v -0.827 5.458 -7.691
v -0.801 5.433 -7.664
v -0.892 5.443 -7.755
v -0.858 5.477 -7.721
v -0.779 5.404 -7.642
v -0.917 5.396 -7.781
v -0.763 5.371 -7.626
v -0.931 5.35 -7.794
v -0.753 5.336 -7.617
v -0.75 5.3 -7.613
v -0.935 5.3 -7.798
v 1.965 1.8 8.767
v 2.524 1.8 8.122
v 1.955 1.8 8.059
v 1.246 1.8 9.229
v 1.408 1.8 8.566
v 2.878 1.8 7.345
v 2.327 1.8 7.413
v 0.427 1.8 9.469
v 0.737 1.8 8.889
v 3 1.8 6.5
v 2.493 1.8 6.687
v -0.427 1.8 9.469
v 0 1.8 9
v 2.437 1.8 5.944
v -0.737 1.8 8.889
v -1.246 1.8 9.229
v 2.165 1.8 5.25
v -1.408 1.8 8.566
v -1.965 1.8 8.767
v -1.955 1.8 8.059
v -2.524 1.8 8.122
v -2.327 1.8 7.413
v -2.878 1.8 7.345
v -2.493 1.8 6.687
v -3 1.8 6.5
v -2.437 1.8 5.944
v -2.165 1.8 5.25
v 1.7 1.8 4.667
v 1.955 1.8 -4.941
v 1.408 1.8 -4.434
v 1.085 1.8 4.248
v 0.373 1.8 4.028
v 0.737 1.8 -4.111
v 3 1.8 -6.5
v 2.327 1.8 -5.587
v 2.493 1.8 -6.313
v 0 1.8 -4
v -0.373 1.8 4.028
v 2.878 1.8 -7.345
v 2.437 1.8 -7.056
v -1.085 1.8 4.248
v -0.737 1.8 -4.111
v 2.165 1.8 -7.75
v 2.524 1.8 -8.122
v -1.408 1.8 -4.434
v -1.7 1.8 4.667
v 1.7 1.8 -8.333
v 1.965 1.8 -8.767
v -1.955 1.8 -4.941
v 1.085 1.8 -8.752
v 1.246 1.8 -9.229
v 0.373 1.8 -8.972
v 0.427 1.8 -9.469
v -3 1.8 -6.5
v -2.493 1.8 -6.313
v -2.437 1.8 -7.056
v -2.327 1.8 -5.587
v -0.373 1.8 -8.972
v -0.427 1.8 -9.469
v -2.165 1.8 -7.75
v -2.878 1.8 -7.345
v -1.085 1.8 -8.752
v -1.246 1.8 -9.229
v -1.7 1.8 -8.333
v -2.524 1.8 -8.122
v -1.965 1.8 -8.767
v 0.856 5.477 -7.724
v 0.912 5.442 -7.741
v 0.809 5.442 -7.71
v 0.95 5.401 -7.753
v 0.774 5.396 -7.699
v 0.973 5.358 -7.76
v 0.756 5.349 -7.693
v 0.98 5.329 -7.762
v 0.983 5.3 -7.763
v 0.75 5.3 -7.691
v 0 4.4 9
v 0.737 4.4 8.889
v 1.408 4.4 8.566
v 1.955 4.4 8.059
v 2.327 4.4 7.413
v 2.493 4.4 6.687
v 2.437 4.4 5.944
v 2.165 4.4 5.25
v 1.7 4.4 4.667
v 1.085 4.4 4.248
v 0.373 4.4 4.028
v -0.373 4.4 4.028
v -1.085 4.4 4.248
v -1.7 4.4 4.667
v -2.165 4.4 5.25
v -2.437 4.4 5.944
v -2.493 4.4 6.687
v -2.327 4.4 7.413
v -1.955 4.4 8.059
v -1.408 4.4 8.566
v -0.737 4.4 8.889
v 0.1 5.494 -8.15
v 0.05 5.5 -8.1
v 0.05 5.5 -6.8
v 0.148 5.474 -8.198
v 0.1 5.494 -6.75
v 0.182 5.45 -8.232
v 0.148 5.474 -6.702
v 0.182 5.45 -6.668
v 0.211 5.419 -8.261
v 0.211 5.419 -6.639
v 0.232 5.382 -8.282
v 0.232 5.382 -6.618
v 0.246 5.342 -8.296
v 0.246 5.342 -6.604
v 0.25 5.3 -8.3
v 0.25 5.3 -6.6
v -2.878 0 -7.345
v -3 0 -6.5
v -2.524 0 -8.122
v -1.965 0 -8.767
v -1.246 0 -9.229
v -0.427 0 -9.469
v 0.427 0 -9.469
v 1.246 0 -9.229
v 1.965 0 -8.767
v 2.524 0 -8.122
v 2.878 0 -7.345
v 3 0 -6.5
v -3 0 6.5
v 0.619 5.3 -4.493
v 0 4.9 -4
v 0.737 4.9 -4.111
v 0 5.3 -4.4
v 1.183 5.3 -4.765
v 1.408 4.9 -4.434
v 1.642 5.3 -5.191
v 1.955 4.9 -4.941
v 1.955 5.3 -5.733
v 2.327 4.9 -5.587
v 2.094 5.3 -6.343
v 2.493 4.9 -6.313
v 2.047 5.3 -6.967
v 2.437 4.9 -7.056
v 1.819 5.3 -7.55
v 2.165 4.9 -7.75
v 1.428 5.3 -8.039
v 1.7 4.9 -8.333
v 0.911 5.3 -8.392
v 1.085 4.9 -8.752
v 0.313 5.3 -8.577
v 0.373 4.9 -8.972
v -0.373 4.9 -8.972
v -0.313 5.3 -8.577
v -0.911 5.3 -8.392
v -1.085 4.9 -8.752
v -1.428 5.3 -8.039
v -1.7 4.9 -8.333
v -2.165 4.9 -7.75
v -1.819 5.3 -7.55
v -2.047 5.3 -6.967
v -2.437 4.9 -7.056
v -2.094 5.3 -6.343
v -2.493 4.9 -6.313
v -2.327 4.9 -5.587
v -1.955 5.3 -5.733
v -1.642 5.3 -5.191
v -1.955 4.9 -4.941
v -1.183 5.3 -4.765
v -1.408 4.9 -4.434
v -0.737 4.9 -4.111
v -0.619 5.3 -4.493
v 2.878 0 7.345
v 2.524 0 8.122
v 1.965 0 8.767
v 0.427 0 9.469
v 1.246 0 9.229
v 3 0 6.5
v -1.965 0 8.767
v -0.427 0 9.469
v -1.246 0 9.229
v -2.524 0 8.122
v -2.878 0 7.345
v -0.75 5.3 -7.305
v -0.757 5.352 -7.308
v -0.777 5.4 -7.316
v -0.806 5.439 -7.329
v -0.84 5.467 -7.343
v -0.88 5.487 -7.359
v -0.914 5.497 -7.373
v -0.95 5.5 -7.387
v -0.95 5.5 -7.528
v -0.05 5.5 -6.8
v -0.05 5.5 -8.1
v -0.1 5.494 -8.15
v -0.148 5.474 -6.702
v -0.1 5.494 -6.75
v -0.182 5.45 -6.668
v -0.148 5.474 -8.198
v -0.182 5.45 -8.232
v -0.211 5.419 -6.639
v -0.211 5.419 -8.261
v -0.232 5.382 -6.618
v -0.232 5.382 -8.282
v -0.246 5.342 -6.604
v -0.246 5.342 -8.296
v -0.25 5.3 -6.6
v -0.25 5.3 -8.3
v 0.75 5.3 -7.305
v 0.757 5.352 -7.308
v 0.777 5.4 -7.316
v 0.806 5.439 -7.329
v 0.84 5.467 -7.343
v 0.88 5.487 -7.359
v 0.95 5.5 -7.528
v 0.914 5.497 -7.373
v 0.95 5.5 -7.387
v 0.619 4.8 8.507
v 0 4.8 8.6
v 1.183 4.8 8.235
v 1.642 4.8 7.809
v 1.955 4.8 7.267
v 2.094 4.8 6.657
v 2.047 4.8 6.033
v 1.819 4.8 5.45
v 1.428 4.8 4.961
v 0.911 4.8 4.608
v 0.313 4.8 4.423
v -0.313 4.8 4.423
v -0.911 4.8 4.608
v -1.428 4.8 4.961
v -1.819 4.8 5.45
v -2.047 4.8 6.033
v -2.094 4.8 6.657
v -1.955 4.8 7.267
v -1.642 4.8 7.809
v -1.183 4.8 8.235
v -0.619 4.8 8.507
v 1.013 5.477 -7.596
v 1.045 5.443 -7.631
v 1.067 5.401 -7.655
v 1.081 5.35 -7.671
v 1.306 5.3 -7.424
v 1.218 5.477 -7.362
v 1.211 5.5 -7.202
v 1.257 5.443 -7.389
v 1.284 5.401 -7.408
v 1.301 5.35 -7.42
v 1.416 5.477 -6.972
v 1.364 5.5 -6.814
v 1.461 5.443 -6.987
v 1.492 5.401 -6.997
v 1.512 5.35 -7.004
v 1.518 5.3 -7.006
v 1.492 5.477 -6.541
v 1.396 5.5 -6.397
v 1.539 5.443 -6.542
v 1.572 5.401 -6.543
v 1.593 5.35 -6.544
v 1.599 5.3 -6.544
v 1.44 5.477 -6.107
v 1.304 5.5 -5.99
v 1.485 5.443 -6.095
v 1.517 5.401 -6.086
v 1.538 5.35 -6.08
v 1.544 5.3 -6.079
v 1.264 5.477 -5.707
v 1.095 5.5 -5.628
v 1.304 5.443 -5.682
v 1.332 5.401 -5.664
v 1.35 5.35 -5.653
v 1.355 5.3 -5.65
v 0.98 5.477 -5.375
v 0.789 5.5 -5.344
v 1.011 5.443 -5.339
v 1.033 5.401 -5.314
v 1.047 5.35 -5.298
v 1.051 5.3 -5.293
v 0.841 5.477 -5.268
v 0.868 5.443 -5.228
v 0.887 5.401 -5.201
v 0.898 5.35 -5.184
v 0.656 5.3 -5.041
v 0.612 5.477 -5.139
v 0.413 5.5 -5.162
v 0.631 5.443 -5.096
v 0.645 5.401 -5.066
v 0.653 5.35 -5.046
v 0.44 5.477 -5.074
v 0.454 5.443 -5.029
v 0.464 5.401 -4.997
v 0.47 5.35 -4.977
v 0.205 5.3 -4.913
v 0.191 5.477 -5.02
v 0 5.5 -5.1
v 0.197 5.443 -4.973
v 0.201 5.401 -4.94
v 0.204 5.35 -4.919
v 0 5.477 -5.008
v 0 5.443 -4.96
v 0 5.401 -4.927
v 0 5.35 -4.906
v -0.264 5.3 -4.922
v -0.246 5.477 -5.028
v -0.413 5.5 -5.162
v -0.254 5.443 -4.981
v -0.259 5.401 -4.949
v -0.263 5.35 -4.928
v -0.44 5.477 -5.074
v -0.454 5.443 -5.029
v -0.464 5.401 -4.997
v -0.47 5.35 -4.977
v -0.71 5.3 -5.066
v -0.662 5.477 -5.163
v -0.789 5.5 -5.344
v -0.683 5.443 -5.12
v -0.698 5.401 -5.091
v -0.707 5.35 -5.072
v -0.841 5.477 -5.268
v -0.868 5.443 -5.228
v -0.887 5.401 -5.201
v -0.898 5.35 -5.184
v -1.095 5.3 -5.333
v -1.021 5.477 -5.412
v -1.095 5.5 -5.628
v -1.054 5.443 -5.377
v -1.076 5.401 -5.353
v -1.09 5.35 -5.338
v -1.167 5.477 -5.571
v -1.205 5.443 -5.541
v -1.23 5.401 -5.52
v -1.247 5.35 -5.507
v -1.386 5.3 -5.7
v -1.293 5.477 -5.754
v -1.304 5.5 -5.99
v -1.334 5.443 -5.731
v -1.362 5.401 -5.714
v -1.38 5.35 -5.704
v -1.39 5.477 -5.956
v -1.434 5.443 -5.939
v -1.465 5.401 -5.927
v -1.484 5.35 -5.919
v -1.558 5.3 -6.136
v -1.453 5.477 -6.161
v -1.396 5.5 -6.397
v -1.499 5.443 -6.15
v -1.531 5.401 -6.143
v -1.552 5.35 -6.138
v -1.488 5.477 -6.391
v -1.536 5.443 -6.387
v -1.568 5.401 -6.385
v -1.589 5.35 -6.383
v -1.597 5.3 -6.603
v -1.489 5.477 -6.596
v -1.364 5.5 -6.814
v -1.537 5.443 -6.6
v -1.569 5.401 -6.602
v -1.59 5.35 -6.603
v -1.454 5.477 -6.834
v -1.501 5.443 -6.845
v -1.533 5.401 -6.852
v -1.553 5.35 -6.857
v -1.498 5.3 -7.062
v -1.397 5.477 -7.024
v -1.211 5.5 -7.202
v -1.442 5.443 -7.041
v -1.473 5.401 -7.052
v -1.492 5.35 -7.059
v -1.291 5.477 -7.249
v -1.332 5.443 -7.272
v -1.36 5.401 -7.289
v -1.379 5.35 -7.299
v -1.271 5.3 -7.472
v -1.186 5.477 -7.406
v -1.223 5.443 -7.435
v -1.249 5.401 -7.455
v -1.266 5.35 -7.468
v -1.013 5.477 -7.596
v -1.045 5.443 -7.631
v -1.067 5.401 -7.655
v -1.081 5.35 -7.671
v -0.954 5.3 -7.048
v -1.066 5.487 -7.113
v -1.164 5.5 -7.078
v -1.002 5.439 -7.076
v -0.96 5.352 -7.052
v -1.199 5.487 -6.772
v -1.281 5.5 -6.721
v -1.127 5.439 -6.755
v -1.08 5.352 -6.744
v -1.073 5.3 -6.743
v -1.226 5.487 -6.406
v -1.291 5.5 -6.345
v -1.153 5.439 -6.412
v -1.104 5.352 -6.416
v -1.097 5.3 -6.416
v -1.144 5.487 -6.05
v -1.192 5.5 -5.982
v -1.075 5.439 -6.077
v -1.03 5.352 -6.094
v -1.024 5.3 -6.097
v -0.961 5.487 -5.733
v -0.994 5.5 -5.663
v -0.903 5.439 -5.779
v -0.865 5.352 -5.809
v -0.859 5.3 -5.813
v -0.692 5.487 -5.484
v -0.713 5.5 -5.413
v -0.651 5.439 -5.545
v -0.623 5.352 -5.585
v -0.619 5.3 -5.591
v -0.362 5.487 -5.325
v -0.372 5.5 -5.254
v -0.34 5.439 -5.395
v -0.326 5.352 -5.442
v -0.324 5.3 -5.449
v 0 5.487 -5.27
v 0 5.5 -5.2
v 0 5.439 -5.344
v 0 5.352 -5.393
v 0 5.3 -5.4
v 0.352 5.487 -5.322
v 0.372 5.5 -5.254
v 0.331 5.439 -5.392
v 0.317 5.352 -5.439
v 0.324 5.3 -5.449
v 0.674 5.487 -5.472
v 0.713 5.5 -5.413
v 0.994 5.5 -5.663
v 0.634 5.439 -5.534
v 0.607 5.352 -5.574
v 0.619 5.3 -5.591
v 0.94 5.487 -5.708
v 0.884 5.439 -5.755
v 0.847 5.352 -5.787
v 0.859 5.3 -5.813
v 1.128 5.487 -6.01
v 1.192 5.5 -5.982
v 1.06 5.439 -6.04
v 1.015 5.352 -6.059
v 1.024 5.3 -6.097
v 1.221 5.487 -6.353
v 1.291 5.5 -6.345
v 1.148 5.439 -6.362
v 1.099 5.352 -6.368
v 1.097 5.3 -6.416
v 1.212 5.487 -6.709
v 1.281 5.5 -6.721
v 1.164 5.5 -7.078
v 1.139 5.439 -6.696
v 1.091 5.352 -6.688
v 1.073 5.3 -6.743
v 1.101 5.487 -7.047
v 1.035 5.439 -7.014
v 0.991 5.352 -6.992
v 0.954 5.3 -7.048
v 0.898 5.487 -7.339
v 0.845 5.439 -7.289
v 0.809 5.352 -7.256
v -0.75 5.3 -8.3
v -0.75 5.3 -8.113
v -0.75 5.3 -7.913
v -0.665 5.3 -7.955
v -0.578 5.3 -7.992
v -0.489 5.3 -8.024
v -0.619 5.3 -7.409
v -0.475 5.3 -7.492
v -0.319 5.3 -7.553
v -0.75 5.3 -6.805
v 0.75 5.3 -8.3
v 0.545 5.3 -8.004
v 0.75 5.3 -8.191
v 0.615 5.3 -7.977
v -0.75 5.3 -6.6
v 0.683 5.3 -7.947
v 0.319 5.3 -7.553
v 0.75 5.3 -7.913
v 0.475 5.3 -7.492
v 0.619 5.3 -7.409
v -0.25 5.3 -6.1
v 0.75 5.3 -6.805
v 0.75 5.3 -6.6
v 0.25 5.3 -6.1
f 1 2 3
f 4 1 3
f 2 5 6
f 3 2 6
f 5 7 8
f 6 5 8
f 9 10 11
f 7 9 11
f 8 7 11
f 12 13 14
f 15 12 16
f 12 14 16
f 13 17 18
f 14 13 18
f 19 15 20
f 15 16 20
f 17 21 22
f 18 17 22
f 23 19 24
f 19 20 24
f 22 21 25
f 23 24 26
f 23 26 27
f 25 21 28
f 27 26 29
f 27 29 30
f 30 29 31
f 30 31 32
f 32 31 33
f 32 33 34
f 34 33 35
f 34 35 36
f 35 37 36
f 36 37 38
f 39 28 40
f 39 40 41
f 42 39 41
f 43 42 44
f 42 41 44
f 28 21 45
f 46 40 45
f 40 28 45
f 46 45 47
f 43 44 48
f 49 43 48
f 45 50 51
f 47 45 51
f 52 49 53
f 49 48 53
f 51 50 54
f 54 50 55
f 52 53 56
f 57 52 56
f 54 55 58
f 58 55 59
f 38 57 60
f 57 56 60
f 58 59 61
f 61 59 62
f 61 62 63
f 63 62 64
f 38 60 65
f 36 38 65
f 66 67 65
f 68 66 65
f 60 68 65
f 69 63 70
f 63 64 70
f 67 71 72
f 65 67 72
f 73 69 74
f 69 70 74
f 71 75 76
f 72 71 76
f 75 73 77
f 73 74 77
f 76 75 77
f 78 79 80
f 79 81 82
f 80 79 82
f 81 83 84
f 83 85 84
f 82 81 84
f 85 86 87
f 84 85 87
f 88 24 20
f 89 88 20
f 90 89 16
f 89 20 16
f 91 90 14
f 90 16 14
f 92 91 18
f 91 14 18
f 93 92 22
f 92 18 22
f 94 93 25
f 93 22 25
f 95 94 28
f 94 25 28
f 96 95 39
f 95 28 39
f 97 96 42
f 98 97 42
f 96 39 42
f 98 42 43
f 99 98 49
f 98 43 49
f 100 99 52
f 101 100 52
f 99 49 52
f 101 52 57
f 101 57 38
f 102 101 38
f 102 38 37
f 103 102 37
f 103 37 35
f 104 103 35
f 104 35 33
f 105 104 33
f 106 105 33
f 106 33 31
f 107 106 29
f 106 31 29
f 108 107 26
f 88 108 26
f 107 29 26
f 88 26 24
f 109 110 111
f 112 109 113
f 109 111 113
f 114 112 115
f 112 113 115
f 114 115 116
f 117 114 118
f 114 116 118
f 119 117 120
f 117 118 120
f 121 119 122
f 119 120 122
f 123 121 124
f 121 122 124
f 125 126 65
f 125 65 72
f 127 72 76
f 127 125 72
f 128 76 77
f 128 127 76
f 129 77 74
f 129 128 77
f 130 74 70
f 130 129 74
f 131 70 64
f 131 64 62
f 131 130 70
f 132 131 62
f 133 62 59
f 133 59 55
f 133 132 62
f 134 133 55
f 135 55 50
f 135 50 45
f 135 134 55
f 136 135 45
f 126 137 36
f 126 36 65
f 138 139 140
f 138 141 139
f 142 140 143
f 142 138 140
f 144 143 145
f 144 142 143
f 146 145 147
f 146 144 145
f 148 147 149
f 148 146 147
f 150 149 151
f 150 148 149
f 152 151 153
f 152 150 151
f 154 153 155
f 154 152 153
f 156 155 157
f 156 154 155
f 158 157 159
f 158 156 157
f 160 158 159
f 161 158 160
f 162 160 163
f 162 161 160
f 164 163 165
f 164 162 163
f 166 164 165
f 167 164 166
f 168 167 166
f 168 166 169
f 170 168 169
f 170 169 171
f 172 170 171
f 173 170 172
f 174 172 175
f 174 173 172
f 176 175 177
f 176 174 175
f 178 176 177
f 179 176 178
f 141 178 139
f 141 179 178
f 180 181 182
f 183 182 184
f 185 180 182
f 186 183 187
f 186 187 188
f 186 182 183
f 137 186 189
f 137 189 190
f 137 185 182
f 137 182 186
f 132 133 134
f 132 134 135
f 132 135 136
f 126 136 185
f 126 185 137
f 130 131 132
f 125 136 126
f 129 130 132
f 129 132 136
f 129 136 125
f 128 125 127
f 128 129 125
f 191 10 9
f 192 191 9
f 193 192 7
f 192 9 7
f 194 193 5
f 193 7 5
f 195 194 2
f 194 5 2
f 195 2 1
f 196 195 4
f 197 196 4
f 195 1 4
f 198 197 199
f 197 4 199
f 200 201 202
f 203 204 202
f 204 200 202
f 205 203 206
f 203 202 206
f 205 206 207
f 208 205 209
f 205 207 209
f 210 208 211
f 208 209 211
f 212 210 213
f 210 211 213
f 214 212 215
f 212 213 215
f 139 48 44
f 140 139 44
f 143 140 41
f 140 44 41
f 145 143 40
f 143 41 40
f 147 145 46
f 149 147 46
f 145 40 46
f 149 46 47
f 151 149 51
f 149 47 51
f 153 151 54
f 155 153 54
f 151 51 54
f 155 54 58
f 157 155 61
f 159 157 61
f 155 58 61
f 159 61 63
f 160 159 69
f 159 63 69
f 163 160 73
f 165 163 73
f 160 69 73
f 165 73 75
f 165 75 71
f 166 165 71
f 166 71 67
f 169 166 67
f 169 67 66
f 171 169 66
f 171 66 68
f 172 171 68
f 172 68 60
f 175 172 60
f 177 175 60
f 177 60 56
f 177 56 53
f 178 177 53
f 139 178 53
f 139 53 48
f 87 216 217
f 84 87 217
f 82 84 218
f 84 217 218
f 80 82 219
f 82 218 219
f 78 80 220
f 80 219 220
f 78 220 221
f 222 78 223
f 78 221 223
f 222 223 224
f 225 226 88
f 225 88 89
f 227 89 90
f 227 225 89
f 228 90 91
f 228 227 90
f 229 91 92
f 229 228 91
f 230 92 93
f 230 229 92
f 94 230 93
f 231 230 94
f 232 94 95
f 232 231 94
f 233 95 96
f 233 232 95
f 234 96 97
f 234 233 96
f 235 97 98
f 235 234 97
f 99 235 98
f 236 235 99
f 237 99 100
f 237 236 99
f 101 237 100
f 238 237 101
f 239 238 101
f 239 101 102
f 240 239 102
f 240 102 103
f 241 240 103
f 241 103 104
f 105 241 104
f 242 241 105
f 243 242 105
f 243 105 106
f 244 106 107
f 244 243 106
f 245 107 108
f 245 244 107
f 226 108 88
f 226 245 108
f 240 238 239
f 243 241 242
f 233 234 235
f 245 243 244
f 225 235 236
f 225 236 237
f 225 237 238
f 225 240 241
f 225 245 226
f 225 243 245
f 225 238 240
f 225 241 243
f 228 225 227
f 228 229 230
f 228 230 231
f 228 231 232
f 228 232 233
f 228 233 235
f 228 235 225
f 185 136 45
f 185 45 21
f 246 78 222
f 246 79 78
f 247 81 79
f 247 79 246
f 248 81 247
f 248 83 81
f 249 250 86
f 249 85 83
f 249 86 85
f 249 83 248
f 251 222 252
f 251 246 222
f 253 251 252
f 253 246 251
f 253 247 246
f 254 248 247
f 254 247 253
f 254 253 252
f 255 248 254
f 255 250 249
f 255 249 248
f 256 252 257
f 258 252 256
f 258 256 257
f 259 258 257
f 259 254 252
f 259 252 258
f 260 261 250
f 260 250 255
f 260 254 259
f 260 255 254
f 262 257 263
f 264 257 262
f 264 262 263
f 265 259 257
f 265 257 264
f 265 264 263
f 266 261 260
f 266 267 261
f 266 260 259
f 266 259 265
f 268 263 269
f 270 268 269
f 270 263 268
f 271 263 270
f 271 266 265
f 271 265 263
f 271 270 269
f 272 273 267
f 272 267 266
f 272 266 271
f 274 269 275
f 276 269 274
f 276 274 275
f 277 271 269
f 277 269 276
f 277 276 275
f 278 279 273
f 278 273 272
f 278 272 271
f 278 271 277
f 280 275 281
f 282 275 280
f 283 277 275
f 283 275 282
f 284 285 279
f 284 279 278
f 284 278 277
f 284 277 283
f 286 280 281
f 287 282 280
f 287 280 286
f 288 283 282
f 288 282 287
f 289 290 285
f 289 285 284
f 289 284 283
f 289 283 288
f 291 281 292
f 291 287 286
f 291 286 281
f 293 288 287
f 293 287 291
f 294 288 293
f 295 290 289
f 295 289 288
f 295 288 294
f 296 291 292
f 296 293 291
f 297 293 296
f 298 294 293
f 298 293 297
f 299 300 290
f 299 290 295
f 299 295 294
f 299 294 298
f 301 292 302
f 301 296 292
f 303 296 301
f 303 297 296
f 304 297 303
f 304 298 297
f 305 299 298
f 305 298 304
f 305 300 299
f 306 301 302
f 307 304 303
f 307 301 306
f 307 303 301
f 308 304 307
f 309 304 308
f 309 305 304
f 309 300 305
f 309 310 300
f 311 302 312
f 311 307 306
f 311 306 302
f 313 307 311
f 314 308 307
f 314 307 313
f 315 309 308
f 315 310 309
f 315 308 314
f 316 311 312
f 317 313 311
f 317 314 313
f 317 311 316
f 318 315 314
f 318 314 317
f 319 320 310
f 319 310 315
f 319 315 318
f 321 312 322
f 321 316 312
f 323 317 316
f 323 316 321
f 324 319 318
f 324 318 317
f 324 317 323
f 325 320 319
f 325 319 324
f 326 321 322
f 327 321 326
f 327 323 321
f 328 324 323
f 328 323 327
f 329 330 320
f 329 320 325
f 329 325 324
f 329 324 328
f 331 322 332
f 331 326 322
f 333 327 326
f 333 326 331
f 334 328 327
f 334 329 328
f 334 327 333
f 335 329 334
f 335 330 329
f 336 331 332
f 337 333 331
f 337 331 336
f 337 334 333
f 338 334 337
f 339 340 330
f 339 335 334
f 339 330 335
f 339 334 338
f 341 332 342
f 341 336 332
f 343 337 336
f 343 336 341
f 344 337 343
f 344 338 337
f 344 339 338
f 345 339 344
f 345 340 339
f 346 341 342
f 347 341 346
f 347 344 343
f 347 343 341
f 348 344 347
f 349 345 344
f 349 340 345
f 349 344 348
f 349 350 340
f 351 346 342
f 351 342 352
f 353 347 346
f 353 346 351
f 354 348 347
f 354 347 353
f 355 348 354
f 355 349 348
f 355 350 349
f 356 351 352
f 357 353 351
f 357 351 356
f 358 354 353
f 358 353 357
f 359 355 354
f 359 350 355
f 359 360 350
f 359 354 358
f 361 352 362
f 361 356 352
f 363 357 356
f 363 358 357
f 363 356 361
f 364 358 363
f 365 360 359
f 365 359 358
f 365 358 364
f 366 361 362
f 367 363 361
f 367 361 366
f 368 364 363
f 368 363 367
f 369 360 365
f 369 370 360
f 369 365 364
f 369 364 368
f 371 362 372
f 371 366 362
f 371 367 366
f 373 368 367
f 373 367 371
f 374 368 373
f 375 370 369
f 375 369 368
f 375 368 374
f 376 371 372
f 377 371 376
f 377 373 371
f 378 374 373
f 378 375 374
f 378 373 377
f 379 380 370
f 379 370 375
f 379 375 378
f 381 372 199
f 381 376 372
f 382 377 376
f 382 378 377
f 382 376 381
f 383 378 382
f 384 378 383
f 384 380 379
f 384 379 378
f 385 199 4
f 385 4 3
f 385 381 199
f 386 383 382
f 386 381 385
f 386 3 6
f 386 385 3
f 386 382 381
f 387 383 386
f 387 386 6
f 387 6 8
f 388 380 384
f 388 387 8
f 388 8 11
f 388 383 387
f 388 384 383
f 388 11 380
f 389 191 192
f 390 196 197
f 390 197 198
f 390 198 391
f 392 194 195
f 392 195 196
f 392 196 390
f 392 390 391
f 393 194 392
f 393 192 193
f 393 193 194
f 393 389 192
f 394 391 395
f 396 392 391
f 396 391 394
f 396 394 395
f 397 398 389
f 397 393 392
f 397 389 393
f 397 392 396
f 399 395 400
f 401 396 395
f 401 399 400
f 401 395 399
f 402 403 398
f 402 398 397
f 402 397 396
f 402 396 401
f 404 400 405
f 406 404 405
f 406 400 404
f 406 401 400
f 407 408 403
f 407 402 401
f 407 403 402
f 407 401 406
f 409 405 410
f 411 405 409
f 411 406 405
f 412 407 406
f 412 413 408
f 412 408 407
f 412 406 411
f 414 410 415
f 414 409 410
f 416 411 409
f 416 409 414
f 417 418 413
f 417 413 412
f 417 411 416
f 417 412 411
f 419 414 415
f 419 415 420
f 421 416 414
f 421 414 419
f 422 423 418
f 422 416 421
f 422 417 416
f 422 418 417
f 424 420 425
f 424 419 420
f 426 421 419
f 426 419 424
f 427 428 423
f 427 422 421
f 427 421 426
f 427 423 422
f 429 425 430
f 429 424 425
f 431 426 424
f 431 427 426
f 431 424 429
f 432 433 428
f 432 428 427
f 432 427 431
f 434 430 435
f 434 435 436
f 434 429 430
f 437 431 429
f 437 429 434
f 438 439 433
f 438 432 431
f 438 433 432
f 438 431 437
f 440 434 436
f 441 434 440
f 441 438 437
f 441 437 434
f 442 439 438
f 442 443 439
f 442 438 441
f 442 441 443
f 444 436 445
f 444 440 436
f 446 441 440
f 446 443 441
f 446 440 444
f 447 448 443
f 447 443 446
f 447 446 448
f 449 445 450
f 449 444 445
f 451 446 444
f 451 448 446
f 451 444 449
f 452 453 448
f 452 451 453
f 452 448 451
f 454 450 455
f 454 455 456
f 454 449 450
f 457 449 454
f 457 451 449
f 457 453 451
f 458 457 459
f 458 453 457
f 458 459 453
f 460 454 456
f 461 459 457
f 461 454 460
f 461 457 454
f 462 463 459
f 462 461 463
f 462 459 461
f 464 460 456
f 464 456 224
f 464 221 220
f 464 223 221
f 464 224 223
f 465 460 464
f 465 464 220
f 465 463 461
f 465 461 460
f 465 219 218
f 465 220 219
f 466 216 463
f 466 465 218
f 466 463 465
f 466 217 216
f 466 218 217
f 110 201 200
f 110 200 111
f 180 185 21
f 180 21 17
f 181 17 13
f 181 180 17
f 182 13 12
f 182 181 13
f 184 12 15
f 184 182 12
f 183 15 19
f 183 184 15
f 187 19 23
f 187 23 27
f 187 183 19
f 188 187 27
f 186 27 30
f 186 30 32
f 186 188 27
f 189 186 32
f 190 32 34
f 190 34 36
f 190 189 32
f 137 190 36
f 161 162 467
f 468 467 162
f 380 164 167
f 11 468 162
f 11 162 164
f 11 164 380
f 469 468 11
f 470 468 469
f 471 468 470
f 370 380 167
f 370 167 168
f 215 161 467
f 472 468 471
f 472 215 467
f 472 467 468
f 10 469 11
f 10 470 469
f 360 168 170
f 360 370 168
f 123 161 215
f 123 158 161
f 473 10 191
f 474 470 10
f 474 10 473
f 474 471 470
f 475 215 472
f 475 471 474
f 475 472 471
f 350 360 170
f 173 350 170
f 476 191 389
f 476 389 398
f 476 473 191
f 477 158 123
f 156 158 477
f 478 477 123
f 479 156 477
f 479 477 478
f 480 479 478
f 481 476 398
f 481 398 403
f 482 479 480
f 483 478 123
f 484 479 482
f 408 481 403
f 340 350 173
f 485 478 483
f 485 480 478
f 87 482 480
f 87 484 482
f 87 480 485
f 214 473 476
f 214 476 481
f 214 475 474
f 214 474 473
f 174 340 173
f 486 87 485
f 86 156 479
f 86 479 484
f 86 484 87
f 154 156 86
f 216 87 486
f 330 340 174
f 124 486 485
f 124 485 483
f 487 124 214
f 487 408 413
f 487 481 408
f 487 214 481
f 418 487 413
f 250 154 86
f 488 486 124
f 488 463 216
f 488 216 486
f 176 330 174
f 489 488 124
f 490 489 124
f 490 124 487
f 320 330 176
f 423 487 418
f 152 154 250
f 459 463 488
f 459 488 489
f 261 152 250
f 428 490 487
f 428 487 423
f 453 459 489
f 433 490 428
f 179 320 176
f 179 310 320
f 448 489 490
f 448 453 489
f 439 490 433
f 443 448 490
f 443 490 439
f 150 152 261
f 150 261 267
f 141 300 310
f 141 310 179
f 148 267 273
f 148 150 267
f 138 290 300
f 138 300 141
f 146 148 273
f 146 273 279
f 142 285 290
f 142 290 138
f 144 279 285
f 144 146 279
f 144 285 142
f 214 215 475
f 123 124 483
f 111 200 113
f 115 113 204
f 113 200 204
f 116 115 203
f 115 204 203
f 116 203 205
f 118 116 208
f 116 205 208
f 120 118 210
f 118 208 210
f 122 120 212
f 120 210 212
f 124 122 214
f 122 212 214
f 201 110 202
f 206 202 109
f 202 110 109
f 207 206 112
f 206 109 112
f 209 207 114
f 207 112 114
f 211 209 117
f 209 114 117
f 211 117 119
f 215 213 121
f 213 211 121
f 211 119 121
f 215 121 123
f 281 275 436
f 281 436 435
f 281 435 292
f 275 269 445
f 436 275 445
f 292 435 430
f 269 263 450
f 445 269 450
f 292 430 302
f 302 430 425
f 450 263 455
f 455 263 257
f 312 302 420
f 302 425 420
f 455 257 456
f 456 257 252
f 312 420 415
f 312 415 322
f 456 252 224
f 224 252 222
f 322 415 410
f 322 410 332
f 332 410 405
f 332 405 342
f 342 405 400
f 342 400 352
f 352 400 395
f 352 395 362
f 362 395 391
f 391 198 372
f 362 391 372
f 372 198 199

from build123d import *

# Parameters (mm, degrees)
BOSS_EXTRUDE1_DEPTH = 1.8
SKETCH2_R           = 2.500000000000001
BOSS_EXTRUDE2_DEPTH = 3
SKETCH3_R           = 2.5000000000000013
BOSS_EXTRUDE3_DEPTH = 0.5
CHAMFER1_SIZE       = 0.4
SKETCH4_W           = 0.5
SKETCH4_H           = 1.7000000000000002
BOSS_EXTRUDE4_DEPTH = 0.2
CHAMFER2_SIZE       = 0.3
CHAMFER2_SIZE_2     = 0.221880218
FILLET1_R           = 0.2


with BuildPart() as part:
    # Sketch1 → Boss-Extrude1 (new body)
    with BuildSketch(Plane(origin=(0, 0, 0), x_dir=(1, 0, 0), z_dir=(0, 1, 0))):
        with BuildLine():
            Line((-3, -6.5), (-3.0000000000000027, 6.499999999999998))
            ThreePointArc((-3.0000000000000027, 6.499999999999998), (-4.2e-15, 9.5), (2.9999999999999973, 6.500000000000002))
            Line((2.9999999999999973, 6.500000000000002), (3, -6.5))
            ThreePointArc((3, -6.5), (-5.5e-16, -9.5), (-3, -6.5))
        make_face()
    extrude(amount=BOSS_EXTRUDE1_DEPTH)

    # Sketch2 → Boss-Extrude2 (add)
    with BuildSketch(Plane(origin=(0, 1.8, 0), x_dir=(1, 0, 0), z_dir=(0, 1, 0))):
        with Locations(Location((-2.39e-15, 6.5, 0), (0, 0, 270))):
            Circle(SKETCH2_R)
        with Locations(Location((0, -6.5, 0), (0, 0, 270))):
            Circle(SKETCH2_R)
    extrude(amount=BOSS_EXTRUDE2_DEPTH)

    # Sketch3 → Boss-Extrude3 (add)
    with BuildSketch(Plane(origin=(0, 4.800000000000001, 0), x_dir=(1, 0, 0), z_dir=(0, 1, 0))):
        with Locations(Location((-2.39e-15, 6.5, 0), (0, 0, 270))):
            Circle(SKETCH3_R)
    extrude(amount=BOSS_EXTRUDE3_DEPTH)

    # Chamfer1
    chamfer1_edges = [part.edges().sort_by_distance(p)[0] for p in [
        (7.7e-16, 4.8, 3.999999999999999),
        (-1.62e-15, 5.300000000000001, -9.000000000000002),
    ]]
    chamfer(chamfer1_edges, length=CHAMFER1_SIZE)

    # Sketch4 → Boss-Extrude4 (add)
    with BuildSketch(Plane(origin=(0, 5.300000000000001, 0), x_dir=(1, 0, 0), z_dir=(0, 1, 0))):
        with BuildLine():
            Line((-0.75, 7.913329402510258), (-0.75, 7.304673846971556))
            ThreePointArc((-0.75, 7.304673846971556), (-4.54e-15, 5.4), (0.75, 7.304673846971556))
            Line((0.75, 7.304673846971556), (0.75, 7.913329402510258))
            ThreePointArc((0.75, 7.913329402510258), (-5.52e-15, 4.9), (-0.75, 7.913329402510258))
        make_face()
        with Locations((-2.76e-15, 7.449999999999999)):
            Rectangle(SKETCH4_W, SKETCH4_H)
    extrude(amount=BOSS_EXTRUDE4_DEPTH)

    # Chamfer2
    # the kernel refuses this chamfer: 0.3, 0.221880218 mm, written as the material it takes off along each edge
    with BuildSketch(Plane(origin=(-0.75, 5.300000000000001, -7.913329402510258), x_dir=(0, 0, 1), z_dir=(0, 1, 0))) as chamfer2_piece_1:
        with BuildLine():
            Line((CHAMFER2_SIZE, 0), (0.11497408326020686, -0.18502591673979885))
            ThreePointArc((0.11497408326020686, -0.18502591673979885), (0.05505412011014688, -0.09562891224277614), (0, 0))
            Line((0, 0), (CHAMFER2_SIZE, 0))
        make_face()
    extrude(amount=0.9715048963897726, mode=Mode.SUBTRACT)
    with BuildSketch(Plane(origin=(0.75, 5.300000000000001, -7.913329402510258), x_dir=(0.8394299671515956, 0, 0.5434678741635711), z_dir=(0, 1, 0))) as chamfer2_piece_2:
        with BuildLine():
            Line((0.27705330102285075, 2e-17), (CHAMFER2_SIZE_2 * 0.543467874804, -CHAMFER2_SIZE_2 * 0.83942996814))
            Line((CHAMFER2_SIZE_2 * 0.543467874804, -CHAMFER2_SIZE_2 * 0.83942996814), (0, 0))
            ThreePointArc((0, 0), (0.14238943823073183, 0.00600337759415658), (0.27705330102285075, 2e-17))
        make_face()
    extrude(amount=0.9123006442989672, mode=Mode.SUBTRACT)

    # Fillet1
    # the kernel refuses this fillet: 0.2 mm, written as the material it takes off along each edge
    with BuildSketch(Plane(origin=(-0.7500000000000032, 5.500000000000001, -6.599999999999999), x_dir=(0, -1, 0), z_dir=(1, 0, 0))) as fillet1_piece_1:
        with BuildLine():
            CenterArc((FILLET1_R, FILLET1_R), FILLET1_R, 180, 90)
            Line((0, FILLET1_R), (0, 0))
            Line((0, 0), (FILLET1_R, 0))
        make_face()
    extrude(amount=1.5000000000000009, mode=Mode.SUBTRACT)
    with BuildSketch(Plane(origin=(-0.2500000000000028, 5.500000000000001, -8.799999999999999), x_dir=(0, -1, 0), z_dir=(0, 0, 1)), Plane(origin=(0.24999999999999725, 5.500000000000001, -6.099999999999998), x_dir=(0, -1, 0), z_dir=(0, 0, -1))) as fillet1_piece_2:
        with BuildLine():
            CenterArc((FILLET1_R, FILLET1_R), FILLET1_R, 180, 90)
            Line((0, FILLET1_R), (0, 0))
            Line((0, 0), (FILLET1_R, 0))
        make_face()
    extrude(amount=2.700000000000001, mode=Mode.SUBTRACT)
    with BuildSketch(Plane(origin=(0.7499999999999977, 5.500000000000001, -8.299999999999999), x_dir=(0, -1, 0), z_dir=(-1, 0, 0))) as fillet1_piece_3:
        with BuildLine():
            CenterArc((FILLET1_R, FILLET1_R), FILLET1_R, 180, 90)
            Line((0, FILLET1_R), (0, 0))
            Line((0, 0), (FILLET1_R, 0))
        make_face()
    extrude(amount=1.5000000000000009, mode=Mode.SUBTRACT)
    with BuildSketch(Plane(origin=(-0.75, 5.500000000000001, -8.11332940251), x_dir=(0, -1, 0), z_dir=(0, 0, 1))) as fillet1_piece_4:
        with BuildLine():
            CenterArc((FILLET1_R, -FILLET1_R), FILLET1_R, 90, 90)
            Line((0, -FILLET1_R), (0, 0))
            Line((0, 0), (FILLET1_R, 0))
        make_face()
    extrude(amount=1.3086555555384454, mode=Mode.SUBTRACT)
    with BuildSketch(Plane(origin=(-8e-17, 5.500000000000001, -6.500000000000001), x_dir=(-0.2897858618854929, 0, -0.9570915077730457), z_dir=(0.9570915077730457, 0, -0.2897858618854929))) as fillet1_piece_5:
        with BuildLine():
            CenterArc((1.1000000000000005 + FILLET1_R, -FILLET1_R), FILLET1_R, 90.00000000000006, 89.99999999999994)
            Line((1.1000000000000005 + FILLET1_R, 0), (1.1000000000000005, 0))
            Line((1.1000000000000005, 0), (1.1000000000000005, -FILLET1_R))
        make_face()
    revolve(axis=Axis((-8e-17, 5.500000000000001, -6.500000000000001), (0, 1, 0)), revolution_arc=326.3097273547943, mode=Mode.SUBTRACT)
    with BuildSketch(Plane(origin=(0.75, 5.500000000000001, -6.804673846971555), x_dir=(0, -1, 0), z_dir=(0, 0, -1))) as fillet1_piece_6:
        with BuildLine():
            CenterArc((FILLET1_R, -FILLET1_R), FILLET1_R, 90, 90)
            Line((0, -FILLET1_R), (0, 0))
            Line((0, 0), (FILLET1_R, 0))
        make_face()
    extrude(amount=1.3867753372771254, mode=Mode.SUBTRACT)
    with BuildSketch(Plane(origin=(8e-17, 5.500000000000001, -6.500000000000001), x_dir=(0.3405261643731297, 0, -0.9402350404964305), z_dir=(-0.9402350404964305, 0, -0.3405261643731297))) as fillet1_piece_7:
        with BuildLine():
            CenterArc((1.5999999999999999 - FILLET1_R, FILLET1_R), FILLET1_R, 270, 90)
            Line((1.5999999999999999 - FILLET1_R, 0), (1.5999999999999999, 0))
            Line((1.5999999999999999, 0), (1.5999999999999999, FILLET1_R))
        make_face()
    revolve(axis=Axis((8e-17, 5.500000000000001, -6.500000000000001), (0, -1, 0)), revolution_arc=322.309003529889, mode=Mode.SUBTRACT)


solid = part.part
